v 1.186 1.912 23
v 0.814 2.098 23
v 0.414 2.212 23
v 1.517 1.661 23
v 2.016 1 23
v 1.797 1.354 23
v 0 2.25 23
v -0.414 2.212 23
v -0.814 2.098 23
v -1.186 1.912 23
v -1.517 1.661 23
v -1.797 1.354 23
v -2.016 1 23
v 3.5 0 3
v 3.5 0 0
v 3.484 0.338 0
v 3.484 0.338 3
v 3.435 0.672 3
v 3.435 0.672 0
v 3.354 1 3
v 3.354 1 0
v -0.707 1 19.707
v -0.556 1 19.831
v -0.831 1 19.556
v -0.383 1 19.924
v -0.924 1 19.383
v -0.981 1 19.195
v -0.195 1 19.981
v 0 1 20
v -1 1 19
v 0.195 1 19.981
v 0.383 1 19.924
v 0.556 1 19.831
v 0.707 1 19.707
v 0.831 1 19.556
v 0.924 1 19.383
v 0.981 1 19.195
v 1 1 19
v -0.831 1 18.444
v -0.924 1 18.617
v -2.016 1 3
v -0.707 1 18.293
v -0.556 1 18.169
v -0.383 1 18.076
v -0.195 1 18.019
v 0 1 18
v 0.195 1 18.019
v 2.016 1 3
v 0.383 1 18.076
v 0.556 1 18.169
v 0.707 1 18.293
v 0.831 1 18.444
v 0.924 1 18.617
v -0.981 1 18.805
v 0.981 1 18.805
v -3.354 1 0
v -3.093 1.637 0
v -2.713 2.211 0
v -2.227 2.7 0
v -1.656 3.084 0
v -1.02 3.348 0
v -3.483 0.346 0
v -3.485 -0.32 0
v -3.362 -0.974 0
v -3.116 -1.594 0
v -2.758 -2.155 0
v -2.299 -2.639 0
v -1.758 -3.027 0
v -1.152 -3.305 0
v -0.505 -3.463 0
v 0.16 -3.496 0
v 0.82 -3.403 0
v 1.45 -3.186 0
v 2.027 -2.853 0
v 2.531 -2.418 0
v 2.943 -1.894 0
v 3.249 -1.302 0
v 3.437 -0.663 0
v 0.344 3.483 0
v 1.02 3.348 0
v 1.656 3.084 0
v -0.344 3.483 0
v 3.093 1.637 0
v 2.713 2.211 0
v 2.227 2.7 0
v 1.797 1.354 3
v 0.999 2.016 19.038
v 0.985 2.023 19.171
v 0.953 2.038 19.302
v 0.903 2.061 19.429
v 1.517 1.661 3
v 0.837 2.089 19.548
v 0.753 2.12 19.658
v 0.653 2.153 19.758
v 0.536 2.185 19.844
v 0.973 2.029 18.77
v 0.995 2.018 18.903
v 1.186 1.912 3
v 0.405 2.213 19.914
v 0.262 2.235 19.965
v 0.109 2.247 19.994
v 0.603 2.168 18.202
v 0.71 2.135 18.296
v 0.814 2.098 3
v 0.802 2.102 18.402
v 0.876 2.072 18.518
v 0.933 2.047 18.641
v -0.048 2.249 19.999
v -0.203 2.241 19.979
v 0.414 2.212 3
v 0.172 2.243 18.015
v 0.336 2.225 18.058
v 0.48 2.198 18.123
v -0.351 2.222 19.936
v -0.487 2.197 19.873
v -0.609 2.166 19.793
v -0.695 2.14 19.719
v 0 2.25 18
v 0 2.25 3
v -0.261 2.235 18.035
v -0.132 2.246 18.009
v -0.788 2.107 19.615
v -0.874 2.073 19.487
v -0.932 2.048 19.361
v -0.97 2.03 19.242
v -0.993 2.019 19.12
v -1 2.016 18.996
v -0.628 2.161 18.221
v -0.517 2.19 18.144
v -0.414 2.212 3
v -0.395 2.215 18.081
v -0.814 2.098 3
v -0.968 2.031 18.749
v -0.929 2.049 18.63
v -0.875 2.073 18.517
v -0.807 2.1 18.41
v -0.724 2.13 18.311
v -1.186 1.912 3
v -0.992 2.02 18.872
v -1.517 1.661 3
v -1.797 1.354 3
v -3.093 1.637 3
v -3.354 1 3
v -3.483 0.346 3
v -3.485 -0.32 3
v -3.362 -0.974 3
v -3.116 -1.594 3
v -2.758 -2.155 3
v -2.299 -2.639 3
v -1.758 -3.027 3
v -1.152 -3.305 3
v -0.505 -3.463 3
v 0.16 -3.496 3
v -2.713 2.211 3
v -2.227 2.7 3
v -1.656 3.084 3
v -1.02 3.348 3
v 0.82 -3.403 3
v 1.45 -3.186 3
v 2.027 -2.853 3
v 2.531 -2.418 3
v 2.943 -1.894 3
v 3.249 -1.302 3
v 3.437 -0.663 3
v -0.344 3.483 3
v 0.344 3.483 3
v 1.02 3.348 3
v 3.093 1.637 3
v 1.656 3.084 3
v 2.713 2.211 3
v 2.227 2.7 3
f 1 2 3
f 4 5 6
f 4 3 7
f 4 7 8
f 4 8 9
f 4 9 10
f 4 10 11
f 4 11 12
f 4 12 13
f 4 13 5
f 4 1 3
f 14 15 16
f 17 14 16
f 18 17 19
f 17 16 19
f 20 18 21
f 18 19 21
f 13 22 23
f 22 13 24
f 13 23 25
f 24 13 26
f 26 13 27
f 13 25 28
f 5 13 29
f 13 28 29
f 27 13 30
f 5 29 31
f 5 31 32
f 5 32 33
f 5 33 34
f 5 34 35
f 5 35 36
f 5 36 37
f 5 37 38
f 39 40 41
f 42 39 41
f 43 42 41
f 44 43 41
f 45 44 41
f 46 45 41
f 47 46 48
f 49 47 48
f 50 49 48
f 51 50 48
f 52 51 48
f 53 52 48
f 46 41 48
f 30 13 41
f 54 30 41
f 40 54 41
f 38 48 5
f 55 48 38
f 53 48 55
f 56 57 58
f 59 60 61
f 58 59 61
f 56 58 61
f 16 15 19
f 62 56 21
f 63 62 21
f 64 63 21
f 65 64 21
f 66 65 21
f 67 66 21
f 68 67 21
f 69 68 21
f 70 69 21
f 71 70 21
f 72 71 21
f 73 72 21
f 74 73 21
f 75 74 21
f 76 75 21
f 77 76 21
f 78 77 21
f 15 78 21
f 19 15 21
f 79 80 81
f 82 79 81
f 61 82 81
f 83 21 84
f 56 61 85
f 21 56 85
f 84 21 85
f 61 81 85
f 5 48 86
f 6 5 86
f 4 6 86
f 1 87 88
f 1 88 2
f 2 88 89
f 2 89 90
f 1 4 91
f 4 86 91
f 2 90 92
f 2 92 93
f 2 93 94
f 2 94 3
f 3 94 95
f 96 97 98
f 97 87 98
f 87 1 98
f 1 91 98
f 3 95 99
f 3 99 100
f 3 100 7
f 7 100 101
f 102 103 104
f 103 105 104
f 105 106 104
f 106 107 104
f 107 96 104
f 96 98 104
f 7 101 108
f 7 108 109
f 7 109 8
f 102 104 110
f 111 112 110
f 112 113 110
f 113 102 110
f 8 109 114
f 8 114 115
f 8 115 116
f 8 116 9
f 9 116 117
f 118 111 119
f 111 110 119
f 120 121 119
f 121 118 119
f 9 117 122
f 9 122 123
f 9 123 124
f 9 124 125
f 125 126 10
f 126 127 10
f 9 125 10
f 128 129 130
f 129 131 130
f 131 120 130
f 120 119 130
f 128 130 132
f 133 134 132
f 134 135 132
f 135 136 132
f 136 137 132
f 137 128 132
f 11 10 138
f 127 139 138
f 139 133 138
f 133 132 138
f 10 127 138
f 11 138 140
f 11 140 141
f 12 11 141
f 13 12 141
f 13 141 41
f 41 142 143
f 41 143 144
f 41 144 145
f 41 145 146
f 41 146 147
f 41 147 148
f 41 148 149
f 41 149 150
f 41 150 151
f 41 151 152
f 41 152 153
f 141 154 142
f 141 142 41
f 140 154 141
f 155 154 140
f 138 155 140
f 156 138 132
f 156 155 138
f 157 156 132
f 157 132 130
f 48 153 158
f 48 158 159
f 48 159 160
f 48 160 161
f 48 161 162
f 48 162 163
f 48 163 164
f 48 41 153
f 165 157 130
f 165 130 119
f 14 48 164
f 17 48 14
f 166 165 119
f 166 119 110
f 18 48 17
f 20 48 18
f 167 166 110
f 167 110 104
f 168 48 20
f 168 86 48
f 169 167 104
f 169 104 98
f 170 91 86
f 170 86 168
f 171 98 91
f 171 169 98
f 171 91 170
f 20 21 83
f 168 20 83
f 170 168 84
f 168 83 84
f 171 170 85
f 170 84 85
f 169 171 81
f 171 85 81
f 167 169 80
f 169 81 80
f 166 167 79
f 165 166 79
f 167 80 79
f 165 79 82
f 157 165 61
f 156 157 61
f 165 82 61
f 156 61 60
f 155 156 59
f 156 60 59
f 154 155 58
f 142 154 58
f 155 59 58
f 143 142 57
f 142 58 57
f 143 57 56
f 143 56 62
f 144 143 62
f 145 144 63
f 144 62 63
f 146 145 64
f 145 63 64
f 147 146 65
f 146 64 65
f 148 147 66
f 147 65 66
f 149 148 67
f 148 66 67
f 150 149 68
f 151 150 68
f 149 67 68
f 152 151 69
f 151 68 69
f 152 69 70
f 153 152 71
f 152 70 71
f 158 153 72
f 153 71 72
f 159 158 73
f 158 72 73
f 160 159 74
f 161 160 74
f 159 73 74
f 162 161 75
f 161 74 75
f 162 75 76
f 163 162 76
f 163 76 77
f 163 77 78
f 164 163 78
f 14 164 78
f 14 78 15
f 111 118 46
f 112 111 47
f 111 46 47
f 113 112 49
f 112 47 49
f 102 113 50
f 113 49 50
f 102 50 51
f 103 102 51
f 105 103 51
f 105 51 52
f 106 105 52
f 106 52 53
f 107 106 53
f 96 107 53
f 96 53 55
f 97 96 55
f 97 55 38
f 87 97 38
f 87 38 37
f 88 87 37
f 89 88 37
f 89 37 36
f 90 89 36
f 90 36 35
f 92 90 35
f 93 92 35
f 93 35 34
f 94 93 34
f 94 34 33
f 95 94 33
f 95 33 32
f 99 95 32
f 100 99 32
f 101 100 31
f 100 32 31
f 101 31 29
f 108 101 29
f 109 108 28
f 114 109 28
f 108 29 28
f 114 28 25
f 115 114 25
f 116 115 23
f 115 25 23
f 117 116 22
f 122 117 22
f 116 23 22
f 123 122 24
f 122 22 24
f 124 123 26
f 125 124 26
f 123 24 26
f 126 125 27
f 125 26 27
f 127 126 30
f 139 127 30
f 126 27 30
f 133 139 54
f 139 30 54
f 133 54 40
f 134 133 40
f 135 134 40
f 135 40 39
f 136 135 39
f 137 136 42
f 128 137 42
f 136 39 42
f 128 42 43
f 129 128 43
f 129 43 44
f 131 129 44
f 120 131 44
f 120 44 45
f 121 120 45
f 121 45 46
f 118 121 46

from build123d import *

# Parameters (mm, degrees)
BOSS_EXTRUDE1_DEPTH = 3
BOSS_EXTRUDE2_DEPTH = 20
SKETCH3_R           = 1
CUT_EXTRUDE1_DEPTH  = 10


with BuildPart() as part:
    # Sketch1 → Boss-Extrude1 (new body)
    with BuildSketch(Plane.XY):
        with BuildLine():
            ThreePointArc((3.354101966, 1), (0, 3.5), (-3.354101966, 1))
            Line((-3.354101966, 1), (3.354101966, 1))
        make_face()
        with BuildLine():
            Line((3.354101966, 1), (-3.354101966, 1))
            ThreePointArc((-3.354101966, 1), (-0.505293538, -3.463333429), (3.5, 0))
            ThreePointArc((3.5, 0), (3.463333429, 0.505293538), (3.354101966, 1))
        make_face()
    extrude(amount=BOSS_EXTRUDE1_DEPTH)

    # Sketch2 → Boss-Extrude2 (add)
    with BuildSketch(Plane.XY.offset(3)):
        with BuildLine():
            ThreePointArc((2.015564437, 1), (0, 2.25), (-2.015564437, 1))
            Line((-2.015564437, 1), (2.015564437, 1))
        make_face()
    extrude(amount=BOSS_EXTRUDE2_DEPTH)

    # Sketch3 → Cut-Extrude1 (cut)
    with BuildSketch(Plane(origin=(0, 1, 0), x_dir=(-1, 0, 0), z_dir=(0, -1, 0))):
        with Locations(Location((0, -19, 0), (0, 0, 90))):
            Circle(SKETCH3_R)
    extrude(amount=-CUT_EXTRUDE1_DEPTH, mode=Mode.SUBTRACT)


solid = part.part
